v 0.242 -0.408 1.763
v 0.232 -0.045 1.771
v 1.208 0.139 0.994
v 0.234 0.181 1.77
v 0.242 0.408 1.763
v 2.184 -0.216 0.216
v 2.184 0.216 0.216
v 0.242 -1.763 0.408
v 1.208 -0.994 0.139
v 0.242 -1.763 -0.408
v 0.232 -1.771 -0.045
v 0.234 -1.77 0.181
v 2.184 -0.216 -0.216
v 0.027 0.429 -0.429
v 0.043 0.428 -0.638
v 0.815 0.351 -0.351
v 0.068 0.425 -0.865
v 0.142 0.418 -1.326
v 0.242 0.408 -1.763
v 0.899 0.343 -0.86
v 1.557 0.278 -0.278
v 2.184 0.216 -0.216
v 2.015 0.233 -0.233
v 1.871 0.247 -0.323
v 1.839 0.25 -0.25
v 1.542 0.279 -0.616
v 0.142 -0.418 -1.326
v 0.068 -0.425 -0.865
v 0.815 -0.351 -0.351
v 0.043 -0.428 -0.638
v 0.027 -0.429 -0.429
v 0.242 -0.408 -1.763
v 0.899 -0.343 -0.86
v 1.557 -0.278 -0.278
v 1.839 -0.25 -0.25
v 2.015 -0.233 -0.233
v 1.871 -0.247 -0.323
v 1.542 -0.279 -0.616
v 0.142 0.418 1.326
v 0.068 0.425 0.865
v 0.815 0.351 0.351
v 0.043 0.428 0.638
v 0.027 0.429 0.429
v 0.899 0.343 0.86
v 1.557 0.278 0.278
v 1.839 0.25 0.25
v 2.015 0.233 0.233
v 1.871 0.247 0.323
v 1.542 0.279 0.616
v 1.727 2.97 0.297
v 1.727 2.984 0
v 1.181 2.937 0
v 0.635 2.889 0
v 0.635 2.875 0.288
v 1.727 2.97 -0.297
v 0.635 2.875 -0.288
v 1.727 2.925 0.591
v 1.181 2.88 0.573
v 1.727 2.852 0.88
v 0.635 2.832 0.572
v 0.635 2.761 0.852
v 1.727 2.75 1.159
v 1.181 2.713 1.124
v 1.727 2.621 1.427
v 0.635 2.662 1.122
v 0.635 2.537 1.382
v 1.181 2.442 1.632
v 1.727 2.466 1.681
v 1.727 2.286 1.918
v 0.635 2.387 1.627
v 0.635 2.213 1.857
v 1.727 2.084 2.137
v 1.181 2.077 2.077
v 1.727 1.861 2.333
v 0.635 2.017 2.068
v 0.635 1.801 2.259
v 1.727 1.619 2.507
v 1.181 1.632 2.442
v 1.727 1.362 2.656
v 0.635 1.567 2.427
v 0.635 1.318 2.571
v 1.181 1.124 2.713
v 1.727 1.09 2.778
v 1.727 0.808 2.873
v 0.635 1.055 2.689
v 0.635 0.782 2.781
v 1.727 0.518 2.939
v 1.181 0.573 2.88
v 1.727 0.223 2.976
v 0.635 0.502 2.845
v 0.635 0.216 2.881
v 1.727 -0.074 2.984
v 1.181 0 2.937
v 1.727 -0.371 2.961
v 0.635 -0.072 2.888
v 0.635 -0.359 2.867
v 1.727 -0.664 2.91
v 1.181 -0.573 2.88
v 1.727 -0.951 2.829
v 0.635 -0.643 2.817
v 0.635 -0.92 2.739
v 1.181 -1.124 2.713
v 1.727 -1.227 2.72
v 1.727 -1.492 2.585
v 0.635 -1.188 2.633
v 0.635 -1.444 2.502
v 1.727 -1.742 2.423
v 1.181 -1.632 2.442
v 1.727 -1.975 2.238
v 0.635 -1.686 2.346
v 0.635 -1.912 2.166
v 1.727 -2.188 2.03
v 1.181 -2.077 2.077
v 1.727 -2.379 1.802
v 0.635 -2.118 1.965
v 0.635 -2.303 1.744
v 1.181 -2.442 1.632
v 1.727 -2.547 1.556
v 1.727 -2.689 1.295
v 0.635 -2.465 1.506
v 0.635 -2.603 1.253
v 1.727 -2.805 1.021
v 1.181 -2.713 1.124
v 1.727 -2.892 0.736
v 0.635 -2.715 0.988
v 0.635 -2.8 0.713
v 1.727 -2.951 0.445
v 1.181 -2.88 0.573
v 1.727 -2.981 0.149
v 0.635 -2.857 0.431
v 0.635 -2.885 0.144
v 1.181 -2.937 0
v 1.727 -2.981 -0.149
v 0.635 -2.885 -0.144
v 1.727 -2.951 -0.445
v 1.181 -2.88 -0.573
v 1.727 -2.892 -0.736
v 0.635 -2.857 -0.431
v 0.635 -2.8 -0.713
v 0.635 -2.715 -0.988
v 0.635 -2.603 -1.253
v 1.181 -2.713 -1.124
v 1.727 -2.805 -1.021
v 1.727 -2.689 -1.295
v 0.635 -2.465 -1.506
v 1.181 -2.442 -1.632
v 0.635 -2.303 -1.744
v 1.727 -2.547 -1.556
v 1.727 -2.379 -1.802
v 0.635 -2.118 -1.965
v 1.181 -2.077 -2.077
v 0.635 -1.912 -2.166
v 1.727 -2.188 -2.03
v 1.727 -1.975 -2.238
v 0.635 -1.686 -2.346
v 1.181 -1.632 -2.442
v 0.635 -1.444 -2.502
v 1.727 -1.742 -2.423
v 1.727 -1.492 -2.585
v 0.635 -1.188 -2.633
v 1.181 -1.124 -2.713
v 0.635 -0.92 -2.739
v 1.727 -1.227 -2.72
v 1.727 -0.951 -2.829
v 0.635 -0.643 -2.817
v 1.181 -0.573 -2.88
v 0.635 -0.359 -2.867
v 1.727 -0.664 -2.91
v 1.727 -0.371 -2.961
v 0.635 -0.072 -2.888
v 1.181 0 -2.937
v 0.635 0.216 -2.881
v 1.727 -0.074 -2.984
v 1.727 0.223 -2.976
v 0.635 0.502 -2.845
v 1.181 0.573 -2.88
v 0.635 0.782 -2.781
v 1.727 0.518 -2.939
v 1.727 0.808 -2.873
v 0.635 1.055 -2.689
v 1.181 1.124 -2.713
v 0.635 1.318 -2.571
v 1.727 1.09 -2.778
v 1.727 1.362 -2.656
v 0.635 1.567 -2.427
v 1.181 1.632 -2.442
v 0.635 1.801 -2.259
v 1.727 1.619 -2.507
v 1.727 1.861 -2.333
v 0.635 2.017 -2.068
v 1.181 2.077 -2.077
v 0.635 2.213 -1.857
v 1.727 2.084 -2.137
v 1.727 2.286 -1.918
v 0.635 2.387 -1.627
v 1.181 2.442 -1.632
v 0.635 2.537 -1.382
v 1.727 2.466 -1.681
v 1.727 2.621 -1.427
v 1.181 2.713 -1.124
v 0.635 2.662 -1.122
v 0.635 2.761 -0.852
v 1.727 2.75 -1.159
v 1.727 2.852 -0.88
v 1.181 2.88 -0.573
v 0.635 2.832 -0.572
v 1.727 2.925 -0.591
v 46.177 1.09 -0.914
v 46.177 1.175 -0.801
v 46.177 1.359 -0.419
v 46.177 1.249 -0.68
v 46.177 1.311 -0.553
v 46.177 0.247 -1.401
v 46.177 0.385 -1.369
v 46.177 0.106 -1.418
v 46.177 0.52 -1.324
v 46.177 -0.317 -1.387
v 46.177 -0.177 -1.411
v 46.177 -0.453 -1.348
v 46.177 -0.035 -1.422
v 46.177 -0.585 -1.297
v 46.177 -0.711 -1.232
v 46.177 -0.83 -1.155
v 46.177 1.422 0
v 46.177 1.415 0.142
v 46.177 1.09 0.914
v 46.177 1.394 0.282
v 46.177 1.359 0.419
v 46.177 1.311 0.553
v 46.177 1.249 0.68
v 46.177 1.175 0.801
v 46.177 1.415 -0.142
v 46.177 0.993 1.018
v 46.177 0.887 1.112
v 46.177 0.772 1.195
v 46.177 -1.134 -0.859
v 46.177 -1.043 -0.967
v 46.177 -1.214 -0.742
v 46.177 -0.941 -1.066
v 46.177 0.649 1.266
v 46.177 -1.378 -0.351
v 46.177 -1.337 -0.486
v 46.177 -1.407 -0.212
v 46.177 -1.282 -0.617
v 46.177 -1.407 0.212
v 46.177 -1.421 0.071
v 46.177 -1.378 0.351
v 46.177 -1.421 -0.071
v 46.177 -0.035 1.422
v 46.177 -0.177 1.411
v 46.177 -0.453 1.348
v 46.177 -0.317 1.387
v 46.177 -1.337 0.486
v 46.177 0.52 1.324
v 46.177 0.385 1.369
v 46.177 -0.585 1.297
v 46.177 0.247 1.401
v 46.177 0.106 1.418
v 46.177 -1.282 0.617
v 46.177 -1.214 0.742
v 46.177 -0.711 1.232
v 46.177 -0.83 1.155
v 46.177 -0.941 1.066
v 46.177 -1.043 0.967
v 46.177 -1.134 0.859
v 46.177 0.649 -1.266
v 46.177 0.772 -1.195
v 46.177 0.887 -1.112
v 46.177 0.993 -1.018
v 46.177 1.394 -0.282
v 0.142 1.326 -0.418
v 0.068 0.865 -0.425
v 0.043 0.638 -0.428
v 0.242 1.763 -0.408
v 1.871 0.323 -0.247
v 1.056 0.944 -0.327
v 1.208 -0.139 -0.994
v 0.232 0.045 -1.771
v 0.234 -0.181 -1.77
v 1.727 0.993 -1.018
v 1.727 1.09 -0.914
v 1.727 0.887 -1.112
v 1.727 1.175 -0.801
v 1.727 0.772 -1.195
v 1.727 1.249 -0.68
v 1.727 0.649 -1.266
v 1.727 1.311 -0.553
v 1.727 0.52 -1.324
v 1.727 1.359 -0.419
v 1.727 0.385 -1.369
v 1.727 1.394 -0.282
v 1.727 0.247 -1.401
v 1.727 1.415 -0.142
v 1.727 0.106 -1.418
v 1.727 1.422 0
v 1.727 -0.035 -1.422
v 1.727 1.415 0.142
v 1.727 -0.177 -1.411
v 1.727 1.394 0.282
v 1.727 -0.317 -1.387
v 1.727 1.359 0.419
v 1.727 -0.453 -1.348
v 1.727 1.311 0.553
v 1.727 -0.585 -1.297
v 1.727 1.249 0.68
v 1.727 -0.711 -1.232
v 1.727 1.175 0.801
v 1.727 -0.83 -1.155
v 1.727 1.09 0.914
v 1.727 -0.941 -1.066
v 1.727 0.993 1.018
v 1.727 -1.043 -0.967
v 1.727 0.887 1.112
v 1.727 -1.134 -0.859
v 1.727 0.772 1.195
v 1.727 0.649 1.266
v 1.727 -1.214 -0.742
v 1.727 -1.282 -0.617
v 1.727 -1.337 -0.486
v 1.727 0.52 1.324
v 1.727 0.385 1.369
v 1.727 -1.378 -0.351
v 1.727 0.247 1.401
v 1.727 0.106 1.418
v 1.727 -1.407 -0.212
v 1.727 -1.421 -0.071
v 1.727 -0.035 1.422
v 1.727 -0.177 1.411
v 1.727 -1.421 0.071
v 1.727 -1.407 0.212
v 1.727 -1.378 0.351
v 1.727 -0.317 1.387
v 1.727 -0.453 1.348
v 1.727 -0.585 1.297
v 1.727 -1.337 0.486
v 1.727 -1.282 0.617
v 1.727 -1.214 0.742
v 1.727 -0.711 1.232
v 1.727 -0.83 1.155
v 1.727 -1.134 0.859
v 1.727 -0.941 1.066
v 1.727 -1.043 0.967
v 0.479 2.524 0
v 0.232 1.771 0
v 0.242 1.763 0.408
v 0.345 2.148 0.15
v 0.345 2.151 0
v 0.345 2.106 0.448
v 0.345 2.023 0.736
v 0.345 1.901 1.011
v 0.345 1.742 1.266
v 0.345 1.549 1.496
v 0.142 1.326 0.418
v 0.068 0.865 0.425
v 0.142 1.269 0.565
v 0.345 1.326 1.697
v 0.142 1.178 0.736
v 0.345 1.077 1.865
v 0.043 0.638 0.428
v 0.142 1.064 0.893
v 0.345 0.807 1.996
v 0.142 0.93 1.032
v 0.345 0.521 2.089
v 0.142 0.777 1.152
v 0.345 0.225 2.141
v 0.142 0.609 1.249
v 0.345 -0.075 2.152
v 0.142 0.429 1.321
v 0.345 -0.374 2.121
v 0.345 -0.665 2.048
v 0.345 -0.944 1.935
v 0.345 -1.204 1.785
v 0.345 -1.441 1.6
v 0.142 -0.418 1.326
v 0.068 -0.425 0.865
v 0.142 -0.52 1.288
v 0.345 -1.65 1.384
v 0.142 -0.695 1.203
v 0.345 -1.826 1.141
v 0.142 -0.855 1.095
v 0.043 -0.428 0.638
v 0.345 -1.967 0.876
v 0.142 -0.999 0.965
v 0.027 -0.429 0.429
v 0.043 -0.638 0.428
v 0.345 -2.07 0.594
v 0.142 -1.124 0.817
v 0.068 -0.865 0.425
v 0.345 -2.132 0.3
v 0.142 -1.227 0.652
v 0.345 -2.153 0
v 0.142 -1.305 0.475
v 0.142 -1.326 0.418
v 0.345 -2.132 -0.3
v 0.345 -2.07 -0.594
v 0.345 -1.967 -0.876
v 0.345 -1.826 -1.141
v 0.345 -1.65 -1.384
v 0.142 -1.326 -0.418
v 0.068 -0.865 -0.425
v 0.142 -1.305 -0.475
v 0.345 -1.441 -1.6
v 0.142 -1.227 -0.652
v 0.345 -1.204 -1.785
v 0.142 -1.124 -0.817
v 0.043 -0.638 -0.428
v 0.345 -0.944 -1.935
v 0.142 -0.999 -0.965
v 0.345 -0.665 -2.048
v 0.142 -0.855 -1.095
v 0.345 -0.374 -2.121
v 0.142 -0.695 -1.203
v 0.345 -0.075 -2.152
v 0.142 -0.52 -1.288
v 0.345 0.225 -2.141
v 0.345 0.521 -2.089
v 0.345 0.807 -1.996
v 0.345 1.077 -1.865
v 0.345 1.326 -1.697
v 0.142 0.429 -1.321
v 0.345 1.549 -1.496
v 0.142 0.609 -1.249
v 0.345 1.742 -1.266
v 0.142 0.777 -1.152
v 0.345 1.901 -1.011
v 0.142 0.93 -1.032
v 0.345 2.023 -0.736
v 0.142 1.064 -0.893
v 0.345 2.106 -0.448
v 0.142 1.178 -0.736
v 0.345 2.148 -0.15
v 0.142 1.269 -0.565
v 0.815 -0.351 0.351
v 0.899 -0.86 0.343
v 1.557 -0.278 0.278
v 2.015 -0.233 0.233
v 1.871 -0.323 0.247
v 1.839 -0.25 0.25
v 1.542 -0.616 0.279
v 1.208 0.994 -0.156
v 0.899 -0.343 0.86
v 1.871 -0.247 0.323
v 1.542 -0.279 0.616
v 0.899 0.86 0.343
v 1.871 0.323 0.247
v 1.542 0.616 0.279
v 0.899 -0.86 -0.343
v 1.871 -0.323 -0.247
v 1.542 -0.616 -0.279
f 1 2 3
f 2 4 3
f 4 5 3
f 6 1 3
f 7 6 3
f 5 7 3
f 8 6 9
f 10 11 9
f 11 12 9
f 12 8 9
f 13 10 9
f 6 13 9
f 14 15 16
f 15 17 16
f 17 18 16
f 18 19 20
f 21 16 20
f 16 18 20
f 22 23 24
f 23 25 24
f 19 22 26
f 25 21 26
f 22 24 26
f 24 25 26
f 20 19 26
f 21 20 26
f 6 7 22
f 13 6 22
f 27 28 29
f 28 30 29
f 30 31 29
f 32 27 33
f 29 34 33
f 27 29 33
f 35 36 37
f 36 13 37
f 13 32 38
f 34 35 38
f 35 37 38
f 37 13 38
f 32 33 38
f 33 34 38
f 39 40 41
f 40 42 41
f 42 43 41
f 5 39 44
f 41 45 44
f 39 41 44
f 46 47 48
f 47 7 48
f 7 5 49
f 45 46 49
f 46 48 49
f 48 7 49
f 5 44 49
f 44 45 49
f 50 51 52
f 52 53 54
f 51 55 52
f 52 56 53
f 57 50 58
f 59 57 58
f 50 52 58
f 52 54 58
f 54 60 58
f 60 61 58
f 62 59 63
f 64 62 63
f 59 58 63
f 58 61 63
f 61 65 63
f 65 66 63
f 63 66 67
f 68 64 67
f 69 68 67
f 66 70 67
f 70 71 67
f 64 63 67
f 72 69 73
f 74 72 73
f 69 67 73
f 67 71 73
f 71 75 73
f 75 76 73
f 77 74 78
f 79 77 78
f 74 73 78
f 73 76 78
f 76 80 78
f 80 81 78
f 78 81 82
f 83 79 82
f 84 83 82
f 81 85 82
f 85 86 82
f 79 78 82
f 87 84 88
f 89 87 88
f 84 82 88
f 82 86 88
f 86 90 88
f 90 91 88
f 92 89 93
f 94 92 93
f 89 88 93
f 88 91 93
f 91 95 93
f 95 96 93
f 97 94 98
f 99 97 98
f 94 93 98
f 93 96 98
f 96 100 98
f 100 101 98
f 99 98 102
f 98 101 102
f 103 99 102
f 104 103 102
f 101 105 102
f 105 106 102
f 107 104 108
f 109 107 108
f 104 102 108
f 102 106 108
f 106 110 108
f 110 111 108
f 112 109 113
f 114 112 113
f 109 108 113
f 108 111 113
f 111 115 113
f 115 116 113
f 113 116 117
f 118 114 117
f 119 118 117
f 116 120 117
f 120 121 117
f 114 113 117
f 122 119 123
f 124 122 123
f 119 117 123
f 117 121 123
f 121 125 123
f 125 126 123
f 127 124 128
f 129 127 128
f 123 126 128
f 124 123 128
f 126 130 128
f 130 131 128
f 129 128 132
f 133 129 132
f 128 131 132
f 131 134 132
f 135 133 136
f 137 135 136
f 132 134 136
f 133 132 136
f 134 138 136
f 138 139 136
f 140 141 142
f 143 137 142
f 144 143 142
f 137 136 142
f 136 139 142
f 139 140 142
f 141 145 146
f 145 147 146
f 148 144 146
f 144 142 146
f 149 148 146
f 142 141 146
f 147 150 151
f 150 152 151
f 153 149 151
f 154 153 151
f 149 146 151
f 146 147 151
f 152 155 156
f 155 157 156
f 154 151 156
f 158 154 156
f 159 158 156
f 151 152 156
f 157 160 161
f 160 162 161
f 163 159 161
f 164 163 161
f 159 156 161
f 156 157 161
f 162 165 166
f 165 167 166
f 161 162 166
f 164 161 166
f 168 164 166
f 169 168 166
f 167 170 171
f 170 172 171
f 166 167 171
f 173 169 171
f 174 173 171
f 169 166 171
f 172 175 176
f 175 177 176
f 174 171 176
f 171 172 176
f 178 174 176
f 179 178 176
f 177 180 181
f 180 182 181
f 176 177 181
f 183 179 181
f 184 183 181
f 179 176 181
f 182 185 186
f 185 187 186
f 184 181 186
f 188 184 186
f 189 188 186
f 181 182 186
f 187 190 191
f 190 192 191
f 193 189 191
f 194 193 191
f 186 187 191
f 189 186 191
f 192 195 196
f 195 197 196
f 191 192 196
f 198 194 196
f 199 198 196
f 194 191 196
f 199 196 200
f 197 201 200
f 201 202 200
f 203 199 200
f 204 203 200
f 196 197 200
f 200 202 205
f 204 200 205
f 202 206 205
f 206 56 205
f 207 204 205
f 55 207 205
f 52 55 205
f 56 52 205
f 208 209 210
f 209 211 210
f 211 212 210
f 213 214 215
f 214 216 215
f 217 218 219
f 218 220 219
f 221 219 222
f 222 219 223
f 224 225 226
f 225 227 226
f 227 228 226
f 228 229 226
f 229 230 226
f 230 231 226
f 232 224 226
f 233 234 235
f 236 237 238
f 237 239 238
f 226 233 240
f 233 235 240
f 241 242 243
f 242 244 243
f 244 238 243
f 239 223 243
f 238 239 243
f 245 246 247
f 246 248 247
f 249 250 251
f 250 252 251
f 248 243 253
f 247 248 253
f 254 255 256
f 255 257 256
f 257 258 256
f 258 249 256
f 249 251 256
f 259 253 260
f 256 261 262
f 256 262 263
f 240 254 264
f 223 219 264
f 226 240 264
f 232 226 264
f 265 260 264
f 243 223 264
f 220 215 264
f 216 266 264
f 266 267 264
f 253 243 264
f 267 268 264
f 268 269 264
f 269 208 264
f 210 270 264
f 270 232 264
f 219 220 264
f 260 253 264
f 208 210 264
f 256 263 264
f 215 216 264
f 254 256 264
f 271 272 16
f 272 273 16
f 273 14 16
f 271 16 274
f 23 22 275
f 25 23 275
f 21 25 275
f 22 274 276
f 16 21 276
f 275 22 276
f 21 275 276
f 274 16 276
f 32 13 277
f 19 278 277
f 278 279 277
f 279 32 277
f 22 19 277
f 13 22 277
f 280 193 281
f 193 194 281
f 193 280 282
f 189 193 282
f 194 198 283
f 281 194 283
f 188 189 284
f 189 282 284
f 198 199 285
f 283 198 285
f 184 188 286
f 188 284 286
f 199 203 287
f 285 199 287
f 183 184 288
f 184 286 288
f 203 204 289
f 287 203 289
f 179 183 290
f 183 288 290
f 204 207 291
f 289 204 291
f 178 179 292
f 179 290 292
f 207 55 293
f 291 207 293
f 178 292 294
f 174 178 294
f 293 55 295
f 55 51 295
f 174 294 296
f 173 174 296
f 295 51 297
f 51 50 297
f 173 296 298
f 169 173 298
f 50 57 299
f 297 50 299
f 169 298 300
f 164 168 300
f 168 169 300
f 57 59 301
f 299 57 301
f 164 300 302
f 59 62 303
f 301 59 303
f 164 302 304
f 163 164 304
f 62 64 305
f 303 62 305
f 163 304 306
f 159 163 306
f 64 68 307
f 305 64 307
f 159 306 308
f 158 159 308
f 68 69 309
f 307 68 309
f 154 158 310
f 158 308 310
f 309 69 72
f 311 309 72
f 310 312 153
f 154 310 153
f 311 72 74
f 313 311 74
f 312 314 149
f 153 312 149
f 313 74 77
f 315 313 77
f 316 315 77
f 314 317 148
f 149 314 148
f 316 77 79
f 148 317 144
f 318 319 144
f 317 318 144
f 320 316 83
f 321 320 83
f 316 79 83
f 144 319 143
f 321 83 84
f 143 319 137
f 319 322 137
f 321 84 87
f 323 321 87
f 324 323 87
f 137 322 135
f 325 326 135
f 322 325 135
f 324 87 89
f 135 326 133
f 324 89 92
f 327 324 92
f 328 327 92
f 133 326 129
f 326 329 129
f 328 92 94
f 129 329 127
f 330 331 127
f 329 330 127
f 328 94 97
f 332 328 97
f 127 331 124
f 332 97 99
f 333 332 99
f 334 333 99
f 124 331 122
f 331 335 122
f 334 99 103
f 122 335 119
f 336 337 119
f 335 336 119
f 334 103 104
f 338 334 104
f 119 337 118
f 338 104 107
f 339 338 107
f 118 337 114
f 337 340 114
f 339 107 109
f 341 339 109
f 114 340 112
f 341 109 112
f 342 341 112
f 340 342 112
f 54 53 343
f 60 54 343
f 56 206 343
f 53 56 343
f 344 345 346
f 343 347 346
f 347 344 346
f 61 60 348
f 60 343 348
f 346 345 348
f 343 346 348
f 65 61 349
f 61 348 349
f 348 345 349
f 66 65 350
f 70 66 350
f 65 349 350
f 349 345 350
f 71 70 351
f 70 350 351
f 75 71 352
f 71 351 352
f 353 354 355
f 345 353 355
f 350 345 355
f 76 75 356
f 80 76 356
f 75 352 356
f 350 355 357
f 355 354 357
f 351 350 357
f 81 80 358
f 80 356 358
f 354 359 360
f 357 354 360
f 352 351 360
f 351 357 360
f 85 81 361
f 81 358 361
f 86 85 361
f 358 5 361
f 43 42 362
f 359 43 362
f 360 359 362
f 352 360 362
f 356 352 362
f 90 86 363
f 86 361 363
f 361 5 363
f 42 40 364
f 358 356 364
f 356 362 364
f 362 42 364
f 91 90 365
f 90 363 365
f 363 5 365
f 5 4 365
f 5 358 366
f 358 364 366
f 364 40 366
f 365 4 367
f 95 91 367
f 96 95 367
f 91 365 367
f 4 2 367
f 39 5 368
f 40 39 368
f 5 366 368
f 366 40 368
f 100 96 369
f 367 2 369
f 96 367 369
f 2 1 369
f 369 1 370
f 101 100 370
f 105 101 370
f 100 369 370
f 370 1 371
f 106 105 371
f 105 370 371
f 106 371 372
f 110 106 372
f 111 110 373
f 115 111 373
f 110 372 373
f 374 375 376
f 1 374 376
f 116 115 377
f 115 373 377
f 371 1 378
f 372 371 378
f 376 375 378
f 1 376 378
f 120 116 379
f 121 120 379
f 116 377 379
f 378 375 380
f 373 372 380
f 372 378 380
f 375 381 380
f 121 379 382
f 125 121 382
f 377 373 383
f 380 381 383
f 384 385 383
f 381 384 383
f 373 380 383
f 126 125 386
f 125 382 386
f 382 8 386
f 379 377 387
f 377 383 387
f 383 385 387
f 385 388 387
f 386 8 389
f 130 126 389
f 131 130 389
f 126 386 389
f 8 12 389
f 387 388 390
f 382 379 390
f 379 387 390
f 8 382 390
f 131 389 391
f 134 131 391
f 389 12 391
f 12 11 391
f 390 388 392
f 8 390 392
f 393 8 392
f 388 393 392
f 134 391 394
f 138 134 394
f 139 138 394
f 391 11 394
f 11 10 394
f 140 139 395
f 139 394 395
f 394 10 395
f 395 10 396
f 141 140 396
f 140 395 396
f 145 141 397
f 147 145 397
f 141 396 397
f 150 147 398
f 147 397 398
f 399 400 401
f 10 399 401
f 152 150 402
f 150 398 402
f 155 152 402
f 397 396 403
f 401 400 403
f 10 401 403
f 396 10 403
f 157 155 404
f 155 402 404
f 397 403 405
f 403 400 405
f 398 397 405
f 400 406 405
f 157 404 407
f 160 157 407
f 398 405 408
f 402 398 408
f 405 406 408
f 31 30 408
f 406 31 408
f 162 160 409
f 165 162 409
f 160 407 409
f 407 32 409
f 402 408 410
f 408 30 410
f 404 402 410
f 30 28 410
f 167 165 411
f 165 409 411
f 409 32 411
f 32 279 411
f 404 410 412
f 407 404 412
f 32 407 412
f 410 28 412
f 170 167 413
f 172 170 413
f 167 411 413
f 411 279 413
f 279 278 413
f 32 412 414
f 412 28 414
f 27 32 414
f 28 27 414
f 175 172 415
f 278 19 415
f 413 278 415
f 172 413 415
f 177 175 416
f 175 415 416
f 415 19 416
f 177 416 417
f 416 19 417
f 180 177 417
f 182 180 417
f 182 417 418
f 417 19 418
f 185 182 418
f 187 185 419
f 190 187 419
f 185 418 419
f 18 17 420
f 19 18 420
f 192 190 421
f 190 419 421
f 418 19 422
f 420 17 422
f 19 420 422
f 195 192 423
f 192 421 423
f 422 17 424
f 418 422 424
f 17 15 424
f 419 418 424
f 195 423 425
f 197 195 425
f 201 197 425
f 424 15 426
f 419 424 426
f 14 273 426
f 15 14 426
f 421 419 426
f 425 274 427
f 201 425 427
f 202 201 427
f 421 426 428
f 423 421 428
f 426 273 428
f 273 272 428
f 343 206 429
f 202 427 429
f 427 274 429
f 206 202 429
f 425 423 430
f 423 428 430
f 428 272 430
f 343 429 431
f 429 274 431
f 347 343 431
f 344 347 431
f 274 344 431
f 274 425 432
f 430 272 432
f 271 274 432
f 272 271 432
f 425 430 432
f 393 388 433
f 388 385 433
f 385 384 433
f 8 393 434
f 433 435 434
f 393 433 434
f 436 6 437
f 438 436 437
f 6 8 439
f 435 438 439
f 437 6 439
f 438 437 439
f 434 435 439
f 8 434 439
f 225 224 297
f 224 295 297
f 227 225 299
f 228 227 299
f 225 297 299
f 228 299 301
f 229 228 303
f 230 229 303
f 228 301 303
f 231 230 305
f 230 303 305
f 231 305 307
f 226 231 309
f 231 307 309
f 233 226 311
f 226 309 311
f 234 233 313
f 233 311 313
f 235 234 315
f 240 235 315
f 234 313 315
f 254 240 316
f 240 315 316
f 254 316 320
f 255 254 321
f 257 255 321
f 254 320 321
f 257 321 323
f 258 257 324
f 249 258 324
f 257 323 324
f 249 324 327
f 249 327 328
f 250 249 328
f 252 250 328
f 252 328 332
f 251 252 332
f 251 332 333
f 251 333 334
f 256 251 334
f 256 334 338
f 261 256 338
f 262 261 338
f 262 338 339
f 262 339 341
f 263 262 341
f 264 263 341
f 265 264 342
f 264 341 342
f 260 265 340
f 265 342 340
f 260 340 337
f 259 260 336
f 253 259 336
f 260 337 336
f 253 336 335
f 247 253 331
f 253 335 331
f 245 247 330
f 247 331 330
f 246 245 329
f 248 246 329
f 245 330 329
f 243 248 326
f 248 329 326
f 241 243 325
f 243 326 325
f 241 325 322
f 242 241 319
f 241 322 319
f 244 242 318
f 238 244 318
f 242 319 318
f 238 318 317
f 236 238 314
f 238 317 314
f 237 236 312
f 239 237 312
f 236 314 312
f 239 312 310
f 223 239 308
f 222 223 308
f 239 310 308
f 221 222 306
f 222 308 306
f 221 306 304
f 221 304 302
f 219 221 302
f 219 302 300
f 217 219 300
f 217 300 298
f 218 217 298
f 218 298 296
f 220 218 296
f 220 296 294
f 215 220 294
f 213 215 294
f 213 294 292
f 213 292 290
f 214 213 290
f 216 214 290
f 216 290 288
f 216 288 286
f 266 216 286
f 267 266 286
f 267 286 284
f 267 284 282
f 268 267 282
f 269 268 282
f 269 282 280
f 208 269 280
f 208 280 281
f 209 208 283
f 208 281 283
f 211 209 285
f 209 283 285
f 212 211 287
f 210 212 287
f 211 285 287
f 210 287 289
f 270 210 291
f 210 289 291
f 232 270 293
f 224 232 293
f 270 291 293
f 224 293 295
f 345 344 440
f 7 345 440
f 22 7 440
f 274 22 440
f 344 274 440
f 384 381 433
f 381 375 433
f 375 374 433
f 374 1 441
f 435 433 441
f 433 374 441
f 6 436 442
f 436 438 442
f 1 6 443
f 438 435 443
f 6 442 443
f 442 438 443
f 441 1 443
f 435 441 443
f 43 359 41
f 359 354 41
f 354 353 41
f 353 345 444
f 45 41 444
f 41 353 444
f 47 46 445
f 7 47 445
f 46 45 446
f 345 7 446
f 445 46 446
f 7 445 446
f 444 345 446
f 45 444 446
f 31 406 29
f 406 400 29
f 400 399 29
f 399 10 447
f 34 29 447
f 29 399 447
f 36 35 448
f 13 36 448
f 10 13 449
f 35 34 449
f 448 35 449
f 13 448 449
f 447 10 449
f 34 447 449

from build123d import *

# Parameters (mm, degrees)
SKETCH3_W         = 0.8636
SKETCH3_H         = 3.9116
SKETCH4_W         = 0.4318
SKETCH4_H         = 0.4318
CIRPATTERN1_COUNT = 2
CIRPATTERN1_ANGLE = 90


with BuildPart() as part:
    # BodySke → Base-Revolve (revolve)
    with BuildSketch(Plane.XY):
        with BuildLine():
            Line((1.7272, 1.4224), (1.7272, 2.9845))
            Line((1.7272, 2.9845), (0.635, 2.888944882))
            ThreePointArc((0.635, 2.888944882), (0.160622478, 1.478954659), (0, 0))
            Line((0, 0), (46.1772, 0))
            Line((46.1772, 0), (46.1772, 1.4224))
            Line((46.1772, 1.4224), (1.7272, 1.4224))
        make_face()
    revolve(axis=Axis((-25.4, 0, 0), (1, 0, 0)))

    # Sketch3 → Cross section 0
    with BuildSketch(Plane(origin=(0, 0, 0), x_dir=(0, 0, -1), z_dir=(1, 0, 0))):
        Rectangle(SKETCH3_W, SKETCH3_H)
    # Sketch4 → Cross section 1
    with BuildSketch(Plane(origin=(2.1844, 0, 0), x_dir=(0, 0, -1), z_dir=(1, 0, 0))):
        Rectangle(SKETCH4_W, SKETCH4_H)
    cross = loft(mode=Mode.SUBTRACT)

    # CirPattern1: Cross ×2 about axis
    cirpattern1_axis = Axis((0, 0, 0), (1, 0, 0))
    for i in range(1, CIRPATTERN1_COUNT):
        add(cross.rotate(cirpattern1_axis, i * CIRPATTERN1_ANGLE / (CIRPATTERN1_COUNT - 1)), mode=Mode.SUBTRACT)


solid = part.part
